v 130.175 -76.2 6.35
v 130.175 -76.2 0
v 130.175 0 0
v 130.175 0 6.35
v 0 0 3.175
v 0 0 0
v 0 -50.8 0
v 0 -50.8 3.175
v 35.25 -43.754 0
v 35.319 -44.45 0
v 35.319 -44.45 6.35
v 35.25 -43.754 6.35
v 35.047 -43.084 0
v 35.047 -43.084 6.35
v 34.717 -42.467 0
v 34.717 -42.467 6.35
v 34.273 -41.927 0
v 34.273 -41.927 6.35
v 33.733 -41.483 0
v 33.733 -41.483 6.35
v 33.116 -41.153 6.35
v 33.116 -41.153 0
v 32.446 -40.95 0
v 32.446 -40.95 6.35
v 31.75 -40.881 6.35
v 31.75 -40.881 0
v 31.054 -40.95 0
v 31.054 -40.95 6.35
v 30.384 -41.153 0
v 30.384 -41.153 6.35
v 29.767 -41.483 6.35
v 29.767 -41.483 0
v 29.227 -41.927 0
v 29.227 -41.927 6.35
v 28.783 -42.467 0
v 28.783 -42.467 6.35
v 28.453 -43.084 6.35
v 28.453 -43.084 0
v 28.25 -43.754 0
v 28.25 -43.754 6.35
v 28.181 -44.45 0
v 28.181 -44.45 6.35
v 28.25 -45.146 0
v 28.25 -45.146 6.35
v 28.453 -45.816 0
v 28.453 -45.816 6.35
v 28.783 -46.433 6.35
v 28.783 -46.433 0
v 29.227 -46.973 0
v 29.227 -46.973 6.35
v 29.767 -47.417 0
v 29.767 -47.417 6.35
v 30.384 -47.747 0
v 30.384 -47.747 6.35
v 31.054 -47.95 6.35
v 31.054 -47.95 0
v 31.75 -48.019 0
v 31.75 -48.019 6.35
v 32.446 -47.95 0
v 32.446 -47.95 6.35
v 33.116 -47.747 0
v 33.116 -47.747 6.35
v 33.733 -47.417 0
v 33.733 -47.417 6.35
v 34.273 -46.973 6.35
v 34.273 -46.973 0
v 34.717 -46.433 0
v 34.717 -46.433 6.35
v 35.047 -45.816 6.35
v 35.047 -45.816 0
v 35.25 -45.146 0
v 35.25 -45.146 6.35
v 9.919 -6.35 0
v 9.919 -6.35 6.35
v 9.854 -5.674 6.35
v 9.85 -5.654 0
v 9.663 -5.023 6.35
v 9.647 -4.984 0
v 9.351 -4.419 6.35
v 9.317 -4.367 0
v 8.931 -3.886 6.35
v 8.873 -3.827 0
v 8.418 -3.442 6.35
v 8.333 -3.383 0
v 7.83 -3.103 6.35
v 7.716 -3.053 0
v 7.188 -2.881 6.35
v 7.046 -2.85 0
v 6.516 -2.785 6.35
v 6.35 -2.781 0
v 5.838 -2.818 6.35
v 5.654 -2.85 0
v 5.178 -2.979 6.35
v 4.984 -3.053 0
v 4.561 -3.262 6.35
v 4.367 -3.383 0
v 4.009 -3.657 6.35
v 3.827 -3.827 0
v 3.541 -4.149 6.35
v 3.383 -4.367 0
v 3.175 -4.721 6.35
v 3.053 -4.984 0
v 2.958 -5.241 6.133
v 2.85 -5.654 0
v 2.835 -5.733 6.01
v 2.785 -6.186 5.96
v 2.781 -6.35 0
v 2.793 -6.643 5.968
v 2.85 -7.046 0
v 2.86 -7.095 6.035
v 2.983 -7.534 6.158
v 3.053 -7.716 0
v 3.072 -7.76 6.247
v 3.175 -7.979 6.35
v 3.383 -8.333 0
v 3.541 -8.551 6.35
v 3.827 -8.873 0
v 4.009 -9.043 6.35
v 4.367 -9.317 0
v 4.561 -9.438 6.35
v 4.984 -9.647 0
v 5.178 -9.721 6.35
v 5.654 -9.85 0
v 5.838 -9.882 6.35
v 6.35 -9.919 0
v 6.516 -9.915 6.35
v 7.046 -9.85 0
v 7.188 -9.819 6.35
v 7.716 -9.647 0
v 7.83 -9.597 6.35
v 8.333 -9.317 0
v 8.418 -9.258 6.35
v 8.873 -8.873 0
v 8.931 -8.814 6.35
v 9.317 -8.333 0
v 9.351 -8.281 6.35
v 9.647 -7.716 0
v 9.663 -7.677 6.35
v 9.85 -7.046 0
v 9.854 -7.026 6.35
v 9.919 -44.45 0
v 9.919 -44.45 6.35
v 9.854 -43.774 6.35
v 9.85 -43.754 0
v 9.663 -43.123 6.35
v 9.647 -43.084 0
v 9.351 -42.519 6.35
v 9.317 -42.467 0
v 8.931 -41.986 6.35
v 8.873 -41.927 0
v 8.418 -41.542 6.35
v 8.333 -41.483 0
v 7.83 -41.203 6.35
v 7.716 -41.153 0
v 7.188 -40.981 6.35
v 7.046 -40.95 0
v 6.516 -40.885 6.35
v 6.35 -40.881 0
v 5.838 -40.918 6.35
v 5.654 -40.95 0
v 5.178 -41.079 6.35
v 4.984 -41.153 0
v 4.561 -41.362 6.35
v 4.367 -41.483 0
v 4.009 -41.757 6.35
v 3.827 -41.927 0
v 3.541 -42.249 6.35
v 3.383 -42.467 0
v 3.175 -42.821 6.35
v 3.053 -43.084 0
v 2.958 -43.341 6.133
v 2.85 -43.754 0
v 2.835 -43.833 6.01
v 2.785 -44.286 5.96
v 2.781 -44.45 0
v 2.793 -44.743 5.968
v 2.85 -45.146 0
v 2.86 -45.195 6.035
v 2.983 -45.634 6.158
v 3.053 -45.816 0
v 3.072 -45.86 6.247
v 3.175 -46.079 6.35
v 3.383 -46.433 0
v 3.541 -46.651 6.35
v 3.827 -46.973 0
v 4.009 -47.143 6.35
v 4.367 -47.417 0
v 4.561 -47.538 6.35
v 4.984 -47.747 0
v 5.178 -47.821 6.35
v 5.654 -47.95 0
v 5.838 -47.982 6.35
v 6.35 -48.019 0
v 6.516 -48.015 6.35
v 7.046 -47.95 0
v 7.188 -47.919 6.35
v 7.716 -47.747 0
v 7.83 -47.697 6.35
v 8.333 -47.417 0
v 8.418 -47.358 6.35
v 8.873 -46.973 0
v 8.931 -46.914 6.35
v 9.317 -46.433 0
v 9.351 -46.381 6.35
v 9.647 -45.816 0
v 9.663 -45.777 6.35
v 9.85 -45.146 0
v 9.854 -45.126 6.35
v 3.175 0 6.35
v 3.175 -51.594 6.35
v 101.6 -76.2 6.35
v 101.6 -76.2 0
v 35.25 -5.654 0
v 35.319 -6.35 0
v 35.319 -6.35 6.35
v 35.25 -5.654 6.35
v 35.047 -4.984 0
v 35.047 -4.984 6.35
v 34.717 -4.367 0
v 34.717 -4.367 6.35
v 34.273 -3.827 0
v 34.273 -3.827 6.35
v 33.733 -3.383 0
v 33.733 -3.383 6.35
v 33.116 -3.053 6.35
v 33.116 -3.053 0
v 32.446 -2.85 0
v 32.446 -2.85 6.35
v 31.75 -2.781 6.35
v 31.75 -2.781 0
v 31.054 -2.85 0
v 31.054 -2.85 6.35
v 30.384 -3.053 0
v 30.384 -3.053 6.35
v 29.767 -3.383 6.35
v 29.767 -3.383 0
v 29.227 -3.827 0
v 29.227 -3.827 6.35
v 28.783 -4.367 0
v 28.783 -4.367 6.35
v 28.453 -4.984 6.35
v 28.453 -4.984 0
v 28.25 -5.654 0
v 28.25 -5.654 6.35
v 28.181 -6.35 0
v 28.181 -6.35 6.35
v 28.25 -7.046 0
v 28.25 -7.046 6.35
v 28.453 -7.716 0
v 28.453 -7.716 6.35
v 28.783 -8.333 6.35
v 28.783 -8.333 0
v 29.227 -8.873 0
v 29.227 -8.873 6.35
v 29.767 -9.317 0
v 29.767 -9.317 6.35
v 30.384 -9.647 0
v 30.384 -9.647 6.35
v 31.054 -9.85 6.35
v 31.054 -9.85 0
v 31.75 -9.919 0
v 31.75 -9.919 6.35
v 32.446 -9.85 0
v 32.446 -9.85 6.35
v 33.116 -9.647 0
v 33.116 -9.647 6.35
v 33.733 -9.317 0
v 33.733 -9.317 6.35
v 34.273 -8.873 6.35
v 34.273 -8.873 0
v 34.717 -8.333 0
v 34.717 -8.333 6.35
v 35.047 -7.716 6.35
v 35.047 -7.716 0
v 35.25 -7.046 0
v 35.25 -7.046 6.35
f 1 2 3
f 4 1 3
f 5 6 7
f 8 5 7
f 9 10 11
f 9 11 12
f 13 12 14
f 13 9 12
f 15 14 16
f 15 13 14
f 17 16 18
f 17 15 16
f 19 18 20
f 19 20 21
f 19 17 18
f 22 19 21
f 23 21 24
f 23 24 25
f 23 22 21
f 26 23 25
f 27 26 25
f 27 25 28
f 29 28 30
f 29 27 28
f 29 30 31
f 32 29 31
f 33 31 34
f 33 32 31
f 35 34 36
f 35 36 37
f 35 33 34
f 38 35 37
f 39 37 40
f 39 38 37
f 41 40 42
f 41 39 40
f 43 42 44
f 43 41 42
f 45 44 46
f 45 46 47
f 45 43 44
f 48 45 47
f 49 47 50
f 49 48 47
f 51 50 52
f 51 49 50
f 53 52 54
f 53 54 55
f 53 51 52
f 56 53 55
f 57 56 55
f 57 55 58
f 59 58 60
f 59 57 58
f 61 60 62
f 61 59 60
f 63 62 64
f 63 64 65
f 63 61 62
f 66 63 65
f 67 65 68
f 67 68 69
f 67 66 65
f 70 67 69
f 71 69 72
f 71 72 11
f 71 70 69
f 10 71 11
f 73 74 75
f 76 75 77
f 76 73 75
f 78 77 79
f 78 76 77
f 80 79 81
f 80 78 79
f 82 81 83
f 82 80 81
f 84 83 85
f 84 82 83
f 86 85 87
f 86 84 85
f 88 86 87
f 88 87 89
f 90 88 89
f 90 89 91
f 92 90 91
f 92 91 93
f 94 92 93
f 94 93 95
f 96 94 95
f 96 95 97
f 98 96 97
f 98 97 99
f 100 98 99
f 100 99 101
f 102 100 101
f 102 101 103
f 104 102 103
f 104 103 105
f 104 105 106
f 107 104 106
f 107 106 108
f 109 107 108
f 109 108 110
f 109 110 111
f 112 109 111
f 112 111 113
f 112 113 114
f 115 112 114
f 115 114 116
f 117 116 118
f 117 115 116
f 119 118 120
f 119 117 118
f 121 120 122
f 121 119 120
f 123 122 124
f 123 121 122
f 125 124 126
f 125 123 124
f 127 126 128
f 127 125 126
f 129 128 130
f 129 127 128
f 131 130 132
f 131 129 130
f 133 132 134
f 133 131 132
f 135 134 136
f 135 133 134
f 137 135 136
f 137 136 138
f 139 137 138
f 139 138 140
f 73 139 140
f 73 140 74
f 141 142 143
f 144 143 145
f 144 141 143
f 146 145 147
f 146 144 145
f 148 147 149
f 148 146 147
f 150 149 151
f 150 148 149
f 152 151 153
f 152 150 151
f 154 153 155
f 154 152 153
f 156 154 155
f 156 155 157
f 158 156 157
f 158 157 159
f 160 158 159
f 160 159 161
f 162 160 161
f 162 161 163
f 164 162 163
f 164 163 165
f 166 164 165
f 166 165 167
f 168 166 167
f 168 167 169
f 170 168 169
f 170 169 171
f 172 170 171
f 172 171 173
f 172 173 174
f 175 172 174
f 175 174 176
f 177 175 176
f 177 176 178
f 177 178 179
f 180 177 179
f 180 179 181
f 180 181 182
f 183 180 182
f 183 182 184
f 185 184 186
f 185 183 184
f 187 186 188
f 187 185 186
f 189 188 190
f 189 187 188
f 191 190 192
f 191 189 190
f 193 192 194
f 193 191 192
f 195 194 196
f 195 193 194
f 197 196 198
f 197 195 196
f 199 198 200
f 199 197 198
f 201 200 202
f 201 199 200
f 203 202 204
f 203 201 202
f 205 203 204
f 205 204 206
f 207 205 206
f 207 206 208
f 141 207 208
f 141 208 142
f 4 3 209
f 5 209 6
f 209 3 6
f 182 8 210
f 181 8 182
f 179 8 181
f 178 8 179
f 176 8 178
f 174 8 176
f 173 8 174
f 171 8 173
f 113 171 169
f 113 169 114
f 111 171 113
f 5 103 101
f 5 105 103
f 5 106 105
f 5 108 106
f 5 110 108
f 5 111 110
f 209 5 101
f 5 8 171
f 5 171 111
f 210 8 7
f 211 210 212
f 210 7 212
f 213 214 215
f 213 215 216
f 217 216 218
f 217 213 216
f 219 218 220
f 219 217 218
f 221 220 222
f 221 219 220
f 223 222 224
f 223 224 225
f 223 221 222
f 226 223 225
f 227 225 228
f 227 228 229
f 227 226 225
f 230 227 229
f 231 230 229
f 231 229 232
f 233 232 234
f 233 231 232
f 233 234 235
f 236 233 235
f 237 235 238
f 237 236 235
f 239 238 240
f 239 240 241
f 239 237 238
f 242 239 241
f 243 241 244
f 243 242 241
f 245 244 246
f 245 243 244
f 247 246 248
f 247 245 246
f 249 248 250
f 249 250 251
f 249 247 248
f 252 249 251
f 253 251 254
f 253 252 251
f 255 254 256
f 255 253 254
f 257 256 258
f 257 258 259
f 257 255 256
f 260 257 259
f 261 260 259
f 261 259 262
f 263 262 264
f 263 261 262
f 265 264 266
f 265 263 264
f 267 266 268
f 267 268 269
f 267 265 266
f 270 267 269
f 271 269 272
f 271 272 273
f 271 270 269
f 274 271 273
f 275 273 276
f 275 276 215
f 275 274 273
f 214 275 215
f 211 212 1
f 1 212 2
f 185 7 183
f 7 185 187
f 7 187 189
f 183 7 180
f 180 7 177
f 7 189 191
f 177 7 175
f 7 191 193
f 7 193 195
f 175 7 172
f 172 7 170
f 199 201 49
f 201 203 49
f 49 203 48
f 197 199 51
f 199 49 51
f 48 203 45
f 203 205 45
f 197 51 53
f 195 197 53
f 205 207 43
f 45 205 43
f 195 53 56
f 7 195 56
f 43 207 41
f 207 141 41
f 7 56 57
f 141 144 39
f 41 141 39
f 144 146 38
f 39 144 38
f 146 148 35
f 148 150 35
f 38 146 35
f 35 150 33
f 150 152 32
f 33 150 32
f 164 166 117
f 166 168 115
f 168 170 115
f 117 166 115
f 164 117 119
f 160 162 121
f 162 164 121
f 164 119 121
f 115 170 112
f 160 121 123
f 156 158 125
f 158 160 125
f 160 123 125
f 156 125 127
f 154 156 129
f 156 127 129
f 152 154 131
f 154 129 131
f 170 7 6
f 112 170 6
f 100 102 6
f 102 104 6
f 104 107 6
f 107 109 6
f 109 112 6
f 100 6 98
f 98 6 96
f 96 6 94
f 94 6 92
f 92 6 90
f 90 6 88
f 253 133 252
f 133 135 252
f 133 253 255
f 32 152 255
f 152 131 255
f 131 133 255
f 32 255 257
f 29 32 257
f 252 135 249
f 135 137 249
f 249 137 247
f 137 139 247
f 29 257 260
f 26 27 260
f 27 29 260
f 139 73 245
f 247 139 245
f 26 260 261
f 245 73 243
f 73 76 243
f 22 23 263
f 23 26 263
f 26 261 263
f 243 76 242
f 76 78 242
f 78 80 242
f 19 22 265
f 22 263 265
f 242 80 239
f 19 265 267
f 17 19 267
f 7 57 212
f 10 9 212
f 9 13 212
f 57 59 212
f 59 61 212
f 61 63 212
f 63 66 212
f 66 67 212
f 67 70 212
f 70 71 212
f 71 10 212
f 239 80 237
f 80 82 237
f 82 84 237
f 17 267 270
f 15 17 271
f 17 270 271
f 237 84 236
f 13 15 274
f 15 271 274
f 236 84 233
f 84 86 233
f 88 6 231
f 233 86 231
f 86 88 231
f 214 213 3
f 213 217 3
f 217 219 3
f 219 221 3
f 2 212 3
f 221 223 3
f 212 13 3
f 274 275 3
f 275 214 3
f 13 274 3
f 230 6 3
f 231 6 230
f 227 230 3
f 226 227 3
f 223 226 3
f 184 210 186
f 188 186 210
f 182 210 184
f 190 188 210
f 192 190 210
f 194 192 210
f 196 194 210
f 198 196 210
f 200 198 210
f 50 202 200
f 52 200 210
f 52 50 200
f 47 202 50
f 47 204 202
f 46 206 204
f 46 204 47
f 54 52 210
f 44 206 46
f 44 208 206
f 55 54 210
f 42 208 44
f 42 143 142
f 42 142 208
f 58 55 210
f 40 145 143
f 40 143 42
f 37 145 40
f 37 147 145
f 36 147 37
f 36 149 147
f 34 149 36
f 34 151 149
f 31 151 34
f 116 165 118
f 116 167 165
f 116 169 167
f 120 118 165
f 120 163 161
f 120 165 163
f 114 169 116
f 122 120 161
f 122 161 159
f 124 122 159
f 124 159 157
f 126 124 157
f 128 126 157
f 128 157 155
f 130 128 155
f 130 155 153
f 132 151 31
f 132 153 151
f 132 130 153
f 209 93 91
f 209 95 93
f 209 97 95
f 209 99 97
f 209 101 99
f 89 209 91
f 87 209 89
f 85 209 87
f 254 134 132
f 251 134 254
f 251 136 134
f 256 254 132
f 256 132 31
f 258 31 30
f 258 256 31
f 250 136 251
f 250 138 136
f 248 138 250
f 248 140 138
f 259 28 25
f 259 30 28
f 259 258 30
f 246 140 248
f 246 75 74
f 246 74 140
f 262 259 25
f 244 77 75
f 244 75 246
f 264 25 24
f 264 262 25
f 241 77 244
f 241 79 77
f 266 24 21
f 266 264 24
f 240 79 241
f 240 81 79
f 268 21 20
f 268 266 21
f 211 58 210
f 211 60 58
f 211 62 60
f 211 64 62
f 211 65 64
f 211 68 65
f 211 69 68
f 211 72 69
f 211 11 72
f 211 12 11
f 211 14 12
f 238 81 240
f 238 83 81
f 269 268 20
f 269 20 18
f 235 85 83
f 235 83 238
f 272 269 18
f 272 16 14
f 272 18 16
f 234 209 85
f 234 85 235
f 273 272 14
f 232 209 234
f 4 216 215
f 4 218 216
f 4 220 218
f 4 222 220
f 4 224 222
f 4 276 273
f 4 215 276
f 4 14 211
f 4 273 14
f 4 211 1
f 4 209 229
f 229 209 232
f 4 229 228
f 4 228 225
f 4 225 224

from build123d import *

# Parameters (mm, degrees)
F0_R        = 3.5687
F1_DEPTH    = 6.35
F2_T1_DEPTH = 67.1301869736


# Not quite as in the source:
# - a fillet or chamfer that OpenCascade refuses, or shapes differently, is made with other operations: its cross-section is extruded or revolved along the edge and cut away or added


with BuildPart() as f1:
    # F0 (on Top) → F1 (new body)
    with BuildSketch(Plane.XY):
        Polygon((130.175, 0), (0, 0), (0, -50.8), (101.6, -76.2), (130.175, -76.2), align=None)
        with Locations((6.35, -44.45)):
            Circle(F0_R, mode=Mode.SUBTRACT)
        with Locations((31.75, -44.45)):
            Circle(F0_R, mode=Mode.SUBTRACT)
        with Locations((6.35, -6.35)):
            Circle(F0_R, mode=Mode.SUBTRACT)
        with Locations((31.75, -6.35)):
            Circle(F0_R, mode=Mode.SUBTRACT)
    extrude(amount=F1_DEPTH)

    # F2: chamfer of 3.175 on 1 edges, made by hand

    # F2_s2 → F2_t1 (cut)
    with BuildSketch(Plane.XZ.offset(-8.1650934868)):
        Polygon((0, 3.175), (3.175, 6.35), (0, 6.35), align=None)
    extrude(amount=F2_T1_DEPTH, mode=Mode.SUBTRACT)


solid = f1.part
